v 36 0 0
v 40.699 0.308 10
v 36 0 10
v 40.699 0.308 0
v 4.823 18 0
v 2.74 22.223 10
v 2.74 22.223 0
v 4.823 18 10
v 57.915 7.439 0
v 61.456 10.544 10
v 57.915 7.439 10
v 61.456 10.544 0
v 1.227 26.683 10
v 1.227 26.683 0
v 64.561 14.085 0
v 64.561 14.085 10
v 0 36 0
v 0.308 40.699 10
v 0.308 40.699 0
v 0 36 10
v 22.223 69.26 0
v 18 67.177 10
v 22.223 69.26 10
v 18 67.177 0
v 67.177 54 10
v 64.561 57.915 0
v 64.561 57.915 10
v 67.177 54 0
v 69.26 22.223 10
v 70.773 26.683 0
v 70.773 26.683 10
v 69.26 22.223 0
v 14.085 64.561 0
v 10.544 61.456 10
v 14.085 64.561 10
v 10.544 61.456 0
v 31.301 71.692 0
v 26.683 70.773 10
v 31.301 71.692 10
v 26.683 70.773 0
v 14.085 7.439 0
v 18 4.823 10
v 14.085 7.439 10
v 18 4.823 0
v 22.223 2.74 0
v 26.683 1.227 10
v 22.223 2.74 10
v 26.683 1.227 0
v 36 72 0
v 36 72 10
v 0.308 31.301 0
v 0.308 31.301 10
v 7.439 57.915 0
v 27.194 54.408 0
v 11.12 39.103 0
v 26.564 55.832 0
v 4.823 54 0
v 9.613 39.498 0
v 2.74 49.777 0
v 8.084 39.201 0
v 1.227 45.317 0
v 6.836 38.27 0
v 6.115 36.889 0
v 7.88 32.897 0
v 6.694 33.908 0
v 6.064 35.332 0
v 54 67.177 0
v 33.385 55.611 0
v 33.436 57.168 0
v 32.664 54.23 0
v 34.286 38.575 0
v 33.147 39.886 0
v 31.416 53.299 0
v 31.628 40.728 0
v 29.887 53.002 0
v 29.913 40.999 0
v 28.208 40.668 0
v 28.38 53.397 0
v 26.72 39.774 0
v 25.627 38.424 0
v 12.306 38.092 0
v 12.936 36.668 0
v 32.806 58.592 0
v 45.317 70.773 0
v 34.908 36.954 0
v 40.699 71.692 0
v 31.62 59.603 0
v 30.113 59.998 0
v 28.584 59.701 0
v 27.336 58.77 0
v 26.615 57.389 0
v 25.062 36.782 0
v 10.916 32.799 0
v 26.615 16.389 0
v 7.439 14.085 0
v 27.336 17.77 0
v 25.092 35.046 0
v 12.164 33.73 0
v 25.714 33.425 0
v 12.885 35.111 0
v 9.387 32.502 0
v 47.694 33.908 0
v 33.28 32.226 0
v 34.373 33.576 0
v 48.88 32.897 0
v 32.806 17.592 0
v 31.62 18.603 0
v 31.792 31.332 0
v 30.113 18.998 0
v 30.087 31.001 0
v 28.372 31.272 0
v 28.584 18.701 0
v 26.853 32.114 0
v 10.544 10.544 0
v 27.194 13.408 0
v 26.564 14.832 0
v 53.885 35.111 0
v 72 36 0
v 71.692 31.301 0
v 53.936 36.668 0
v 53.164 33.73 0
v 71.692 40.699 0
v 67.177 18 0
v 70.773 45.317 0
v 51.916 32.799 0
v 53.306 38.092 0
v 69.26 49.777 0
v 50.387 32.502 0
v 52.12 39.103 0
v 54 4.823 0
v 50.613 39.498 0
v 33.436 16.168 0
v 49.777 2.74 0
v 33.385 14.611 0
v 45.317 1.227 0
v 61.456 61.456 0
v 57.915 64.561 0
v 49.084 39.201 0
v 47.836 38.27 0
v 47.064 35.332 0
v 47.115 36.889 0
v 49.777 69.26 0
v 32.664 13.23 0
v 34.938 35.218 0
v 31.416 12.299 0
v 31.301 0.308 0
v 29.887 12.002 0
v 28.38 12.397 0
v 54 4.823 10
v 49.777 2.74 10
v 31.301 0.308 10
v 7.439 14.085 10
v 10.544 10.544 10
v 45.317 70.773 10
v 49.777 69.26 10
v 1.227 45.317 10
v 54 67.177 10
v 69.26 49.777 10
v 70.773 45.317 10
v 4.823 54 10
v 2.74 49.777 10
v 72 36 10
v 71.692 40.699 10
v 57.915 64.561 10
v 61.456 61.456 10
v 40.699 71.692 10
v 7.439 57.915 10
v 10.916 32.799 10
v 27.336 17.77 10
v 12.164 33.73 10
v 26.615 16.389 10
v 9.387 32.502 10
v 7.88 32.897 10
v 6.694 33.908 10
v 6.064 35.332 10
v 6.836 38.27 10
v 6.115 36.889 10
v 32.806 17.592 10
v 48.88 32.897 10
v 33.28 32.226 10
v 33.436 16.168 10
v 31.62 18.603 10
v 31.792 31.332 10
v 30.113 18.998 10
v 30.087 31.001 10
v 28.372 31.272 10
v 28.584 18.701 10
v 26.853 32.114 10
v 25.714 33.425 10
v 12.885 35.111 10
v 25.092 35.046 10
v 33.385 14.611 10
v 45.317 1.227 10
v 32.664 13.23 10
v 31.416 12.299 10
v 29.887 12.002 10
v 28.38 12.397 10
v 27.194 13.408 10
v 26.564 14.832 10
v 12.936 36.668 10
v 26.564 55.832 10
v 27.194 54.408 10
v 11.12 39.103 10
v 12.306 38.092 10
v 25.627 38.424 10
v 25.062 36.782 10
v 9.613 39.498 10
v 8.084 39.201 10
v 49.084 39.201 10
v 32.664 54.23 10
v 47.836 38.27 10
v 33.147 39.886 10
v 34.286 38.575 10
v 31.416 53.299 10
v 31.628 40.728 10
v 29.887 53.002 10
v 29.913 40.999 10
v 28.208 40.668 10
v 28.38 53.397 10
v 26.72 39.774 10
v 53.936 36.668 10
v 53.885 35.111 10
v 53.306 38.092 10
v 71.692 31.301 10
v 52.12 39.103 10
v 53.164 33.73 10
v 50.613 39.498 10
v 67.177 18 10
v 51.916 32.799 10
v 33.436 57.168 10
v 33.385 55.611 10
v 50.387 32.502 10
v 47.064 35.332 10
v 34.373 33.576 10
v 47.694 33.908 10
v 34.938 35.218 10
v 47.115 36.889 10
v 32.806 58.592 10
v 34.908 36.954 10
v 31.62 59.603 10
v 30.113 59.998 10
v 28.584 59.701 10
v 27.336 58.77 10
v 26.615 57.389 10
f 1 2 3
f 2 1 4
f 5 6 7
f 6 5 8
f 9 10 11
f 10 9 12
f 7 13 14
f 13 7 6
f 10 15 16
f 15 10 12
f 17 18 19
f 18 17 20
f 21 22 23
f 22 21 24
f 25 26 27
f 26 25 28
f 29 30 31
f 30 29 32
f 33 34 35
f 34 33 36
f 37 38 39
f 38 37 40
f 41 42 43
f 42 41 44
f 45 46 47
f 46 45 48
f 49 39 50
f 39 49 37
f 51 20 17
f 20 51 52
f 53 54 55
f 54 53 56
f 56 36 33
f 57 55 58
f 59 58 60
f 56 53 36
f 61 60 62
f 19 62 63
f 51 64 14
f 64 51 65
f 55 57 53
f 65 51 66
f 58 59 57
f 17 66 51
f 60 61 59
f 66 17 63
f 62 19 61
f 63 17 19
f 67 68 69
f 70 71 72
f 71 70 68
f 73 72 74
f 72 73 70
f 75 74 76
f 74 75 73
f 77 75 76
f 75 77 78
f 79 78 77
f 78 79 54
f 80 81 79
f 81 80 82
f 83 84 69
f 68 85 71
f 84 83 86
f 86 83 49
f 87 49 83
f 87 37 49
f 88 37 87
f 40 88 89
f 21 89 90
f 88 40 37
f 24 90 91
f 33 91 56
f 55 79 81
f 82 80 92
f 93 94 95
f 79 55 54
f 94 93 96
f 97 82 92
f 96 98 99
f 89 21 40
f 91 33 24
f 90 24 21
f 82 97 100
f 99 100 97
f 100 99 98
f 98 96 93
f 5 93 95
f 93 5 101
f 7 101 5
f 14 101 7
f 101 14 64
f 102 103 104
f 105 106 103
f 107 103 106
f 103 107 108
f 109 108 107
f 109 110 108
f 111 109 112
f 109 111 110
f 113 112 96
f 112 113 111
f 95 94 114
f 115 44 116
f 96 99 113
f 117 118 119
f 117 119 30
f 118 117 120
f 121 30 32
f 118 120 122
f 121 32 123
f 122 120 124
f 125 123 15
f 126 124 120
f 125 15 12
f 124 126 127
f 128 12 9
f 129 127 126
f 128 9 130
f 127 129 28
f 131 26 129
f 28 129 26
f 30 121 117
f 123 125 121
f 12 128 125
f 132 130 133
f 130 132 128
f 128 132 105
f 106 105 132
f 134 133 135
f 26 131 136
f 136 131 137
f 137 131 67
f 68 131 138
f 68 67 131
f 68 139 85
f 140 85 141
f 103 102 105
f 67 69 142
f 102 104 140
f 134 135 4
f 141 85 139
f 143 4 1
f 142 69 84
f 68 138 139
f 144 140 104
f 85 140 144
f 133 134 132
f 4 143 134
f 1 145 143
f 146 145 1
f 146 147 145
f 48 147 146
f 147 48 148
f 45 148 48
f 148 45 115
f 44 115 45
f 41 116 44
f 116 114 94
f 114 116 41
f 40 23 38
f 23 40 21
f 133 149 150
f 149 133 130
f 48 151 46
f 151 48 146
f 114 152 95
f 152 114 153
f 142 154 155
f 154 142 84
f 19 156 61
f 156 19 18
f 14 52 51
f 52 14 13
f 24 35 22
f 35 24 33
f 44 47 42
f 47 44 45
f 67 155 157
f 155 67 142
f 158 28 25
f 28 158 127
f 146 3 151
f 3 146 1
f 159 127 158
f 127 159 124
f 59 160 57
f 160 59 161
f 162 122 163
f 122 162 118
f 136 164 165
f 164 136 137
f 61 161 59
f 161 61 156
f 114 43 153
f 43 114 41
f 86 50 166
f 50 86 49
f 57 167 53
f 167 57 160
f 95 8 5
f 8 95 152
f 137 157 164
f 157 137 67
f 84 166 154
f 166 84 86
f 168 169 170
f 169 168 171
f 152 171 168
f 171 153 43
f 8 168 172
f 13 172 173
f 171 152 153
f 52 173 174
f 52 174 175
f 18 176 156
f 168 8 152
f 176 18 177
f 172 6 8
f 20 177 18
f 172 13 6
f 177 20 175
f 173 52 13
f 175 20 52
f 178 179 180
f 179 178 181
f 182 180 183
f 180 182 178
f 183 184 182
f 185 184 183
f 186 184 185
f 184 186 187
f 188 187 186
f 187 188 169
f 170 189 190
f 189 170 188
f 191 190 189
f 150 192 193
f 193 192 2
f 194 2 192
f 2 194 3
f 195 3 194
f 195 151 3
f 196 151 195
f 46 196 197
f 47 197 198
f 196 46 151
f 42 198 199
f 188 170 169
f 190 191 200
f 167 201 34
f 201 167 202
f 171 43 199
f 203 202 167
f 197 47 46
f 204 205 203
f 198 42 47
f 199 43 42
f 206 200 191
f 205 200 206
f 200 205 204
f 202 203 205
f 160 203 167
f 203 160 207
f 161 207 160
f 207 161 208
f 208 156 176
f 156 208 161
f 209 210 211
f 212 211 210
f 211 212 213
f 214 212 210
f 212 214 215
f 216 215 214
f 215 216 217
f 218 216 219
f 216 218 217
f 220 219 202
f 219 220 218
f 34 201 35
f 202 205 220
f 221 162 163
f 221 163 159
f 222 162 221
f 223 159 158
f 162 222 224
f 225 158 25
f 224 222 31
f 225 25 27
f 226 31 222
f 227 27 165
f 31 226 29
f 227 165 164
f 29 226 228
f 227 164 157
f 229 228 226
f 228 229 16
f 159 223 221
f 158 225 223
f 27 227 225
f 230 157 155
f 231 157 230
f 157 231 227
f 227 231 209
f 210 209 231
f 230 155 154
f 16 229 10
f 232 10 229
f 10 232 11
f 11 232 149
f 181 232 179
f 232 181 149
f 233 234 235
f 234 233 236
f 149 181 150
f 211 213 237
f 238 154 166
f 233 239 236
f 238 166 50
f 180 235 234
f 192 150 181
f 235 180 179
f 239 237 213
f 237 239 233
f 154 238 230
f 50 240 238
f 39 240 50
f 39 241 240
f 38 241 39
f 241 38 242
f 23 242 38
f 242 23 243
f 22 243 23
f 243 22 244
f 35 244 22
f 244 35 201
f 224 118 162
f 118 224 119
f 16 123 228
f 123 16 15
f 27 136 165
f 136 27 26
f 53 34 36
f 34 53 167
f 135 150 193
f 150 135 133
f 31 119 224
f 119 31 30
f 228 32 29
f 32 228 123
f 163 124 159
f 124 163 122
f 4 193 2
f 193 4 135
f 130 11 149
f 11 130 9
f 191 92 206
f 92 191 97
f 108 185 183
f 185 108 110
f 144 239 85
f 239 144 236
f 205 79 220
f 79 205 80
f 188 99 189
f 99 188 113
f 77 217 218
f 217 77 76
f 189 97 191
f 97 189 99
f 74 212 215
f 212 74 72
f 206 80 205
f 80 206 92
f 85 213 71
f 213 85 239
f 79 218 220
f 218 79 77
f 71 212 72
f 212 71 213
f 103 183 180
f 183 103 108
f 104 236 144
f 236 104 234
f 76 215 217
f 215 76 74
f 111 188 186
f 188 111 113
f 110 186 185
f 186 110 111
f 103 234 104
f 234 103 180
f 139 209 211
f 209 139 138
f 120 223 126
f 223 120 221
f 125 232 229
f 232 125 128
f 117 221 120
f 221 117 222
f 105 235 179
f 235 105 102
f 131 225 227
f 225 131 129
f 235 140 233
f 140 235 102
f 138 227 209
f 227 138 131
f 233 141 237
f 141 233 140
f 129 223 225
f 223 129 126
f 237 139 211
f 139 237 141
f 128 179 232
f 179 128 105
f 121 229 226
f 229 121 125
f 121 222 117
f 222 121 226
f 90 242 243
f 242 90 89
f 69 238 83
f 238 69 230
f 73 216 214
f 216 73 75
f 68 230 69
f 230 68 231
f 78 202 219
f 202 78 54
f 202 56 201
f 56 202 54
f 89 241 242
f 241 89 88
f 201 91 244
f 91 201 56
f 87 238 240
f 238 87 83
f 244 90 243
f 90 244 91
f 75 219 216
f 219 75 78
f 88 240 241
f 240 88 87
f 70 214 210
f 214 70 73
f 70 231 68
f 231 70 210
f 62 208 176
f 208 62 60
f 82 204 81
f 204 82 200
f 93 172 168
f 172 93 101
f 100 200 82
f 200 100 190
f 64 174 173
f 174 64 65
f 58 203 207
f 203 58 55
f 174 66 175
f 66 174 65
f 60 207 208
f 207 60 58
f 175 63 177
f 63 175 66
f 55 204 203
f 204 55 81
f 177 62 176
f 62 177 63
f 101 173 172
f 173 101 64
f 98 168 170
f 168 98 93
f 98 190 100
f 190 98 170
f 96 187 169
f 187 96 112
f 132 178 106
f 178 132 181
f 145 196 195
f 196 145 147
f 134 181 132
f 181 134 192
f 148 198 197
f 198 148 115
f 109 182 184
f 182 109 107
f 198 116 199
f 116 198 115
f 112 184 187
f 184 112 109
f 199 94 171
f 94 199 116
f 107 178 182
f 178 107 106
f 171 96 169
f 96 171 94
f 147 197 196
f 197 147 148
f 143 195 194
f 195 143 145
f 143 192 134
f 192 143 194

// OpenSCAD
$fn = 32;

// ----------------------------------------------------------------------
// Cam plate: eccentric cam, base R36
// ----------------------------------------------------------------------

// --- parameters (mm) ---
base_r = 36;              // base circle radius
lobe_h = 14;              // cam lobe rise
bore_r = 5;               // shaft bore radius
plate_t = 10;             // plate thickness, Z (extrusion height)
ecc = 6;                  // disc eccentricity
ring_r = 20.5;            // lightening ring radius
bolt_r = 3.5;             // lightening hole radius

profile = [[72, 36], [71.692, 40.699], [70.773, 45.317], [69.26, 49.777], [67.177, 54], [64.561, 57.915], [61.456, 61.456], [57.915, 64.561], [54, 67.177], [49.777, 69.26], [45.317, 70.773], [40.699, 71.692], [36, 72], [31.301, 71.692], [26.683, 70.773], [22.223, 69.26], [18, 67.177], [14.085, 64.561], [10.544, 61.456], [7.439, 57.915], [4.823, 54], [2.74, 49.777], [1.227, 45.317], [0.308, 40.699], [0, 36], [0.308, 31.301], [1.227, 26.683], [2.74, 22.223], [4.823, 18], [7.439, 14.085], [10.544, 10.544], [14.085, 7.439], [18, 4.823], [22.223, 2.74], [26.683, 1.227], [31.301, 0.308], [36, 0], [40.699, 0.308], [45.317, 1.227], [49.777, 2.74], [54, 4.823], [57.915, 7.439], [61.456, 10.544], [64.561, 14.085], [67.177, 18], [69.26, 22.223], [70.773, 26.683], [71.692, 31.301]];  // primary outline, 48 points, counter clockwise
void_1 = [[34.908, 36.954], [34.286, 38.575], [33.147, 39.886], [31.628, 40.728], [29.913, 40.999], [28.208, 40.668], [26.72, 39.774], [25.627, 38.424], [25.062, 36.782], [25.092, 35.046], [25.714, 33.425], [26.853, 32.114], [28.372, 31.272], [30.087, 31.001], [31.792, 31.332], [33.28, 32.226], [34.373, 33.576], [34.938, 35.218]];  // shaft bore, 18 points
void_2 = [[53.936, 36.668], [53.306, 38.092], [52.12, 39.103], [50.613, 39.498], [49.084, 39.201], [47.836, 38.27], [47.115, 36.889], [47.064, 35.332], [47.694, 33.908], [48.88, 32.897], [50.387, 32.502], [51.916, 32.799], [53.164, 33.73], [53.885, 35.111]];  // lightening hole 1, 14 points
void_3 = [[33.436, 57.168], [32.806, 58.592], [31.62, 59.603], [30.113, 59.998], [28.584, 59.701], [27.336, 58.77], [26.615, 57.389], [26.564, 55.832], [27.194, 54.408], [28.38, 53.397], [29.887, 53.002], [31.416, 53.299], [32.664, 54.23], [33.385, 55.611]];  // lightening hole 2, 14 points
void_4 = [[12.936, 36.668], [12.306, 38.092], [11.12, 39.103], [9.613, 39.498], [8.084, 39.201], [6.836, 38.27], [6.115, 36.889], [6.064, 35.332], [6.694, 33.908], [7.88, 32.897], [9.387, 32.502], [10.916, 32.799], [12.164, 33.73], [12.885, 35.111]];  // lightening hole 3, 14 points
void_5 = [[33.436, 16.168], [32.806, 17.592], [31.62, 18.603], [30.113, 18.998], [28.584, 18.701], [27.336, 17.77], [26.615, 16.389], [26.564, 14.832], [27.194, 13.408], [28.38, 12.397], [29.887, 12.002], [31.416, 12.299], [32.664, 13.23], [33.385, 14.611]];  // lightening hole 4, 14 points

// --- the one profile operation ---
difference() {
  linear_extrude(height = plate_t) polygon(points = profile);
  translate([0, 0, -1])
    linear_extrude(height = plate_t + 2) polygon(points = void_1);
  translate([0, 0, -1])
    linear_extrude(height = plate_t + 2) polygon(points = void_2);
  translate([0, 0, -1])
    linear_extrude(height = plate_t + 2) polygon(points = void_3);
  translate([0, 0, -1])
    linear_extrude(height = plate_t + 2) polygon(points = void_4);
  translate([0, 0, -1])
    linear_extrude(height = plate_t + 2) polygon(points = void_5);
}
